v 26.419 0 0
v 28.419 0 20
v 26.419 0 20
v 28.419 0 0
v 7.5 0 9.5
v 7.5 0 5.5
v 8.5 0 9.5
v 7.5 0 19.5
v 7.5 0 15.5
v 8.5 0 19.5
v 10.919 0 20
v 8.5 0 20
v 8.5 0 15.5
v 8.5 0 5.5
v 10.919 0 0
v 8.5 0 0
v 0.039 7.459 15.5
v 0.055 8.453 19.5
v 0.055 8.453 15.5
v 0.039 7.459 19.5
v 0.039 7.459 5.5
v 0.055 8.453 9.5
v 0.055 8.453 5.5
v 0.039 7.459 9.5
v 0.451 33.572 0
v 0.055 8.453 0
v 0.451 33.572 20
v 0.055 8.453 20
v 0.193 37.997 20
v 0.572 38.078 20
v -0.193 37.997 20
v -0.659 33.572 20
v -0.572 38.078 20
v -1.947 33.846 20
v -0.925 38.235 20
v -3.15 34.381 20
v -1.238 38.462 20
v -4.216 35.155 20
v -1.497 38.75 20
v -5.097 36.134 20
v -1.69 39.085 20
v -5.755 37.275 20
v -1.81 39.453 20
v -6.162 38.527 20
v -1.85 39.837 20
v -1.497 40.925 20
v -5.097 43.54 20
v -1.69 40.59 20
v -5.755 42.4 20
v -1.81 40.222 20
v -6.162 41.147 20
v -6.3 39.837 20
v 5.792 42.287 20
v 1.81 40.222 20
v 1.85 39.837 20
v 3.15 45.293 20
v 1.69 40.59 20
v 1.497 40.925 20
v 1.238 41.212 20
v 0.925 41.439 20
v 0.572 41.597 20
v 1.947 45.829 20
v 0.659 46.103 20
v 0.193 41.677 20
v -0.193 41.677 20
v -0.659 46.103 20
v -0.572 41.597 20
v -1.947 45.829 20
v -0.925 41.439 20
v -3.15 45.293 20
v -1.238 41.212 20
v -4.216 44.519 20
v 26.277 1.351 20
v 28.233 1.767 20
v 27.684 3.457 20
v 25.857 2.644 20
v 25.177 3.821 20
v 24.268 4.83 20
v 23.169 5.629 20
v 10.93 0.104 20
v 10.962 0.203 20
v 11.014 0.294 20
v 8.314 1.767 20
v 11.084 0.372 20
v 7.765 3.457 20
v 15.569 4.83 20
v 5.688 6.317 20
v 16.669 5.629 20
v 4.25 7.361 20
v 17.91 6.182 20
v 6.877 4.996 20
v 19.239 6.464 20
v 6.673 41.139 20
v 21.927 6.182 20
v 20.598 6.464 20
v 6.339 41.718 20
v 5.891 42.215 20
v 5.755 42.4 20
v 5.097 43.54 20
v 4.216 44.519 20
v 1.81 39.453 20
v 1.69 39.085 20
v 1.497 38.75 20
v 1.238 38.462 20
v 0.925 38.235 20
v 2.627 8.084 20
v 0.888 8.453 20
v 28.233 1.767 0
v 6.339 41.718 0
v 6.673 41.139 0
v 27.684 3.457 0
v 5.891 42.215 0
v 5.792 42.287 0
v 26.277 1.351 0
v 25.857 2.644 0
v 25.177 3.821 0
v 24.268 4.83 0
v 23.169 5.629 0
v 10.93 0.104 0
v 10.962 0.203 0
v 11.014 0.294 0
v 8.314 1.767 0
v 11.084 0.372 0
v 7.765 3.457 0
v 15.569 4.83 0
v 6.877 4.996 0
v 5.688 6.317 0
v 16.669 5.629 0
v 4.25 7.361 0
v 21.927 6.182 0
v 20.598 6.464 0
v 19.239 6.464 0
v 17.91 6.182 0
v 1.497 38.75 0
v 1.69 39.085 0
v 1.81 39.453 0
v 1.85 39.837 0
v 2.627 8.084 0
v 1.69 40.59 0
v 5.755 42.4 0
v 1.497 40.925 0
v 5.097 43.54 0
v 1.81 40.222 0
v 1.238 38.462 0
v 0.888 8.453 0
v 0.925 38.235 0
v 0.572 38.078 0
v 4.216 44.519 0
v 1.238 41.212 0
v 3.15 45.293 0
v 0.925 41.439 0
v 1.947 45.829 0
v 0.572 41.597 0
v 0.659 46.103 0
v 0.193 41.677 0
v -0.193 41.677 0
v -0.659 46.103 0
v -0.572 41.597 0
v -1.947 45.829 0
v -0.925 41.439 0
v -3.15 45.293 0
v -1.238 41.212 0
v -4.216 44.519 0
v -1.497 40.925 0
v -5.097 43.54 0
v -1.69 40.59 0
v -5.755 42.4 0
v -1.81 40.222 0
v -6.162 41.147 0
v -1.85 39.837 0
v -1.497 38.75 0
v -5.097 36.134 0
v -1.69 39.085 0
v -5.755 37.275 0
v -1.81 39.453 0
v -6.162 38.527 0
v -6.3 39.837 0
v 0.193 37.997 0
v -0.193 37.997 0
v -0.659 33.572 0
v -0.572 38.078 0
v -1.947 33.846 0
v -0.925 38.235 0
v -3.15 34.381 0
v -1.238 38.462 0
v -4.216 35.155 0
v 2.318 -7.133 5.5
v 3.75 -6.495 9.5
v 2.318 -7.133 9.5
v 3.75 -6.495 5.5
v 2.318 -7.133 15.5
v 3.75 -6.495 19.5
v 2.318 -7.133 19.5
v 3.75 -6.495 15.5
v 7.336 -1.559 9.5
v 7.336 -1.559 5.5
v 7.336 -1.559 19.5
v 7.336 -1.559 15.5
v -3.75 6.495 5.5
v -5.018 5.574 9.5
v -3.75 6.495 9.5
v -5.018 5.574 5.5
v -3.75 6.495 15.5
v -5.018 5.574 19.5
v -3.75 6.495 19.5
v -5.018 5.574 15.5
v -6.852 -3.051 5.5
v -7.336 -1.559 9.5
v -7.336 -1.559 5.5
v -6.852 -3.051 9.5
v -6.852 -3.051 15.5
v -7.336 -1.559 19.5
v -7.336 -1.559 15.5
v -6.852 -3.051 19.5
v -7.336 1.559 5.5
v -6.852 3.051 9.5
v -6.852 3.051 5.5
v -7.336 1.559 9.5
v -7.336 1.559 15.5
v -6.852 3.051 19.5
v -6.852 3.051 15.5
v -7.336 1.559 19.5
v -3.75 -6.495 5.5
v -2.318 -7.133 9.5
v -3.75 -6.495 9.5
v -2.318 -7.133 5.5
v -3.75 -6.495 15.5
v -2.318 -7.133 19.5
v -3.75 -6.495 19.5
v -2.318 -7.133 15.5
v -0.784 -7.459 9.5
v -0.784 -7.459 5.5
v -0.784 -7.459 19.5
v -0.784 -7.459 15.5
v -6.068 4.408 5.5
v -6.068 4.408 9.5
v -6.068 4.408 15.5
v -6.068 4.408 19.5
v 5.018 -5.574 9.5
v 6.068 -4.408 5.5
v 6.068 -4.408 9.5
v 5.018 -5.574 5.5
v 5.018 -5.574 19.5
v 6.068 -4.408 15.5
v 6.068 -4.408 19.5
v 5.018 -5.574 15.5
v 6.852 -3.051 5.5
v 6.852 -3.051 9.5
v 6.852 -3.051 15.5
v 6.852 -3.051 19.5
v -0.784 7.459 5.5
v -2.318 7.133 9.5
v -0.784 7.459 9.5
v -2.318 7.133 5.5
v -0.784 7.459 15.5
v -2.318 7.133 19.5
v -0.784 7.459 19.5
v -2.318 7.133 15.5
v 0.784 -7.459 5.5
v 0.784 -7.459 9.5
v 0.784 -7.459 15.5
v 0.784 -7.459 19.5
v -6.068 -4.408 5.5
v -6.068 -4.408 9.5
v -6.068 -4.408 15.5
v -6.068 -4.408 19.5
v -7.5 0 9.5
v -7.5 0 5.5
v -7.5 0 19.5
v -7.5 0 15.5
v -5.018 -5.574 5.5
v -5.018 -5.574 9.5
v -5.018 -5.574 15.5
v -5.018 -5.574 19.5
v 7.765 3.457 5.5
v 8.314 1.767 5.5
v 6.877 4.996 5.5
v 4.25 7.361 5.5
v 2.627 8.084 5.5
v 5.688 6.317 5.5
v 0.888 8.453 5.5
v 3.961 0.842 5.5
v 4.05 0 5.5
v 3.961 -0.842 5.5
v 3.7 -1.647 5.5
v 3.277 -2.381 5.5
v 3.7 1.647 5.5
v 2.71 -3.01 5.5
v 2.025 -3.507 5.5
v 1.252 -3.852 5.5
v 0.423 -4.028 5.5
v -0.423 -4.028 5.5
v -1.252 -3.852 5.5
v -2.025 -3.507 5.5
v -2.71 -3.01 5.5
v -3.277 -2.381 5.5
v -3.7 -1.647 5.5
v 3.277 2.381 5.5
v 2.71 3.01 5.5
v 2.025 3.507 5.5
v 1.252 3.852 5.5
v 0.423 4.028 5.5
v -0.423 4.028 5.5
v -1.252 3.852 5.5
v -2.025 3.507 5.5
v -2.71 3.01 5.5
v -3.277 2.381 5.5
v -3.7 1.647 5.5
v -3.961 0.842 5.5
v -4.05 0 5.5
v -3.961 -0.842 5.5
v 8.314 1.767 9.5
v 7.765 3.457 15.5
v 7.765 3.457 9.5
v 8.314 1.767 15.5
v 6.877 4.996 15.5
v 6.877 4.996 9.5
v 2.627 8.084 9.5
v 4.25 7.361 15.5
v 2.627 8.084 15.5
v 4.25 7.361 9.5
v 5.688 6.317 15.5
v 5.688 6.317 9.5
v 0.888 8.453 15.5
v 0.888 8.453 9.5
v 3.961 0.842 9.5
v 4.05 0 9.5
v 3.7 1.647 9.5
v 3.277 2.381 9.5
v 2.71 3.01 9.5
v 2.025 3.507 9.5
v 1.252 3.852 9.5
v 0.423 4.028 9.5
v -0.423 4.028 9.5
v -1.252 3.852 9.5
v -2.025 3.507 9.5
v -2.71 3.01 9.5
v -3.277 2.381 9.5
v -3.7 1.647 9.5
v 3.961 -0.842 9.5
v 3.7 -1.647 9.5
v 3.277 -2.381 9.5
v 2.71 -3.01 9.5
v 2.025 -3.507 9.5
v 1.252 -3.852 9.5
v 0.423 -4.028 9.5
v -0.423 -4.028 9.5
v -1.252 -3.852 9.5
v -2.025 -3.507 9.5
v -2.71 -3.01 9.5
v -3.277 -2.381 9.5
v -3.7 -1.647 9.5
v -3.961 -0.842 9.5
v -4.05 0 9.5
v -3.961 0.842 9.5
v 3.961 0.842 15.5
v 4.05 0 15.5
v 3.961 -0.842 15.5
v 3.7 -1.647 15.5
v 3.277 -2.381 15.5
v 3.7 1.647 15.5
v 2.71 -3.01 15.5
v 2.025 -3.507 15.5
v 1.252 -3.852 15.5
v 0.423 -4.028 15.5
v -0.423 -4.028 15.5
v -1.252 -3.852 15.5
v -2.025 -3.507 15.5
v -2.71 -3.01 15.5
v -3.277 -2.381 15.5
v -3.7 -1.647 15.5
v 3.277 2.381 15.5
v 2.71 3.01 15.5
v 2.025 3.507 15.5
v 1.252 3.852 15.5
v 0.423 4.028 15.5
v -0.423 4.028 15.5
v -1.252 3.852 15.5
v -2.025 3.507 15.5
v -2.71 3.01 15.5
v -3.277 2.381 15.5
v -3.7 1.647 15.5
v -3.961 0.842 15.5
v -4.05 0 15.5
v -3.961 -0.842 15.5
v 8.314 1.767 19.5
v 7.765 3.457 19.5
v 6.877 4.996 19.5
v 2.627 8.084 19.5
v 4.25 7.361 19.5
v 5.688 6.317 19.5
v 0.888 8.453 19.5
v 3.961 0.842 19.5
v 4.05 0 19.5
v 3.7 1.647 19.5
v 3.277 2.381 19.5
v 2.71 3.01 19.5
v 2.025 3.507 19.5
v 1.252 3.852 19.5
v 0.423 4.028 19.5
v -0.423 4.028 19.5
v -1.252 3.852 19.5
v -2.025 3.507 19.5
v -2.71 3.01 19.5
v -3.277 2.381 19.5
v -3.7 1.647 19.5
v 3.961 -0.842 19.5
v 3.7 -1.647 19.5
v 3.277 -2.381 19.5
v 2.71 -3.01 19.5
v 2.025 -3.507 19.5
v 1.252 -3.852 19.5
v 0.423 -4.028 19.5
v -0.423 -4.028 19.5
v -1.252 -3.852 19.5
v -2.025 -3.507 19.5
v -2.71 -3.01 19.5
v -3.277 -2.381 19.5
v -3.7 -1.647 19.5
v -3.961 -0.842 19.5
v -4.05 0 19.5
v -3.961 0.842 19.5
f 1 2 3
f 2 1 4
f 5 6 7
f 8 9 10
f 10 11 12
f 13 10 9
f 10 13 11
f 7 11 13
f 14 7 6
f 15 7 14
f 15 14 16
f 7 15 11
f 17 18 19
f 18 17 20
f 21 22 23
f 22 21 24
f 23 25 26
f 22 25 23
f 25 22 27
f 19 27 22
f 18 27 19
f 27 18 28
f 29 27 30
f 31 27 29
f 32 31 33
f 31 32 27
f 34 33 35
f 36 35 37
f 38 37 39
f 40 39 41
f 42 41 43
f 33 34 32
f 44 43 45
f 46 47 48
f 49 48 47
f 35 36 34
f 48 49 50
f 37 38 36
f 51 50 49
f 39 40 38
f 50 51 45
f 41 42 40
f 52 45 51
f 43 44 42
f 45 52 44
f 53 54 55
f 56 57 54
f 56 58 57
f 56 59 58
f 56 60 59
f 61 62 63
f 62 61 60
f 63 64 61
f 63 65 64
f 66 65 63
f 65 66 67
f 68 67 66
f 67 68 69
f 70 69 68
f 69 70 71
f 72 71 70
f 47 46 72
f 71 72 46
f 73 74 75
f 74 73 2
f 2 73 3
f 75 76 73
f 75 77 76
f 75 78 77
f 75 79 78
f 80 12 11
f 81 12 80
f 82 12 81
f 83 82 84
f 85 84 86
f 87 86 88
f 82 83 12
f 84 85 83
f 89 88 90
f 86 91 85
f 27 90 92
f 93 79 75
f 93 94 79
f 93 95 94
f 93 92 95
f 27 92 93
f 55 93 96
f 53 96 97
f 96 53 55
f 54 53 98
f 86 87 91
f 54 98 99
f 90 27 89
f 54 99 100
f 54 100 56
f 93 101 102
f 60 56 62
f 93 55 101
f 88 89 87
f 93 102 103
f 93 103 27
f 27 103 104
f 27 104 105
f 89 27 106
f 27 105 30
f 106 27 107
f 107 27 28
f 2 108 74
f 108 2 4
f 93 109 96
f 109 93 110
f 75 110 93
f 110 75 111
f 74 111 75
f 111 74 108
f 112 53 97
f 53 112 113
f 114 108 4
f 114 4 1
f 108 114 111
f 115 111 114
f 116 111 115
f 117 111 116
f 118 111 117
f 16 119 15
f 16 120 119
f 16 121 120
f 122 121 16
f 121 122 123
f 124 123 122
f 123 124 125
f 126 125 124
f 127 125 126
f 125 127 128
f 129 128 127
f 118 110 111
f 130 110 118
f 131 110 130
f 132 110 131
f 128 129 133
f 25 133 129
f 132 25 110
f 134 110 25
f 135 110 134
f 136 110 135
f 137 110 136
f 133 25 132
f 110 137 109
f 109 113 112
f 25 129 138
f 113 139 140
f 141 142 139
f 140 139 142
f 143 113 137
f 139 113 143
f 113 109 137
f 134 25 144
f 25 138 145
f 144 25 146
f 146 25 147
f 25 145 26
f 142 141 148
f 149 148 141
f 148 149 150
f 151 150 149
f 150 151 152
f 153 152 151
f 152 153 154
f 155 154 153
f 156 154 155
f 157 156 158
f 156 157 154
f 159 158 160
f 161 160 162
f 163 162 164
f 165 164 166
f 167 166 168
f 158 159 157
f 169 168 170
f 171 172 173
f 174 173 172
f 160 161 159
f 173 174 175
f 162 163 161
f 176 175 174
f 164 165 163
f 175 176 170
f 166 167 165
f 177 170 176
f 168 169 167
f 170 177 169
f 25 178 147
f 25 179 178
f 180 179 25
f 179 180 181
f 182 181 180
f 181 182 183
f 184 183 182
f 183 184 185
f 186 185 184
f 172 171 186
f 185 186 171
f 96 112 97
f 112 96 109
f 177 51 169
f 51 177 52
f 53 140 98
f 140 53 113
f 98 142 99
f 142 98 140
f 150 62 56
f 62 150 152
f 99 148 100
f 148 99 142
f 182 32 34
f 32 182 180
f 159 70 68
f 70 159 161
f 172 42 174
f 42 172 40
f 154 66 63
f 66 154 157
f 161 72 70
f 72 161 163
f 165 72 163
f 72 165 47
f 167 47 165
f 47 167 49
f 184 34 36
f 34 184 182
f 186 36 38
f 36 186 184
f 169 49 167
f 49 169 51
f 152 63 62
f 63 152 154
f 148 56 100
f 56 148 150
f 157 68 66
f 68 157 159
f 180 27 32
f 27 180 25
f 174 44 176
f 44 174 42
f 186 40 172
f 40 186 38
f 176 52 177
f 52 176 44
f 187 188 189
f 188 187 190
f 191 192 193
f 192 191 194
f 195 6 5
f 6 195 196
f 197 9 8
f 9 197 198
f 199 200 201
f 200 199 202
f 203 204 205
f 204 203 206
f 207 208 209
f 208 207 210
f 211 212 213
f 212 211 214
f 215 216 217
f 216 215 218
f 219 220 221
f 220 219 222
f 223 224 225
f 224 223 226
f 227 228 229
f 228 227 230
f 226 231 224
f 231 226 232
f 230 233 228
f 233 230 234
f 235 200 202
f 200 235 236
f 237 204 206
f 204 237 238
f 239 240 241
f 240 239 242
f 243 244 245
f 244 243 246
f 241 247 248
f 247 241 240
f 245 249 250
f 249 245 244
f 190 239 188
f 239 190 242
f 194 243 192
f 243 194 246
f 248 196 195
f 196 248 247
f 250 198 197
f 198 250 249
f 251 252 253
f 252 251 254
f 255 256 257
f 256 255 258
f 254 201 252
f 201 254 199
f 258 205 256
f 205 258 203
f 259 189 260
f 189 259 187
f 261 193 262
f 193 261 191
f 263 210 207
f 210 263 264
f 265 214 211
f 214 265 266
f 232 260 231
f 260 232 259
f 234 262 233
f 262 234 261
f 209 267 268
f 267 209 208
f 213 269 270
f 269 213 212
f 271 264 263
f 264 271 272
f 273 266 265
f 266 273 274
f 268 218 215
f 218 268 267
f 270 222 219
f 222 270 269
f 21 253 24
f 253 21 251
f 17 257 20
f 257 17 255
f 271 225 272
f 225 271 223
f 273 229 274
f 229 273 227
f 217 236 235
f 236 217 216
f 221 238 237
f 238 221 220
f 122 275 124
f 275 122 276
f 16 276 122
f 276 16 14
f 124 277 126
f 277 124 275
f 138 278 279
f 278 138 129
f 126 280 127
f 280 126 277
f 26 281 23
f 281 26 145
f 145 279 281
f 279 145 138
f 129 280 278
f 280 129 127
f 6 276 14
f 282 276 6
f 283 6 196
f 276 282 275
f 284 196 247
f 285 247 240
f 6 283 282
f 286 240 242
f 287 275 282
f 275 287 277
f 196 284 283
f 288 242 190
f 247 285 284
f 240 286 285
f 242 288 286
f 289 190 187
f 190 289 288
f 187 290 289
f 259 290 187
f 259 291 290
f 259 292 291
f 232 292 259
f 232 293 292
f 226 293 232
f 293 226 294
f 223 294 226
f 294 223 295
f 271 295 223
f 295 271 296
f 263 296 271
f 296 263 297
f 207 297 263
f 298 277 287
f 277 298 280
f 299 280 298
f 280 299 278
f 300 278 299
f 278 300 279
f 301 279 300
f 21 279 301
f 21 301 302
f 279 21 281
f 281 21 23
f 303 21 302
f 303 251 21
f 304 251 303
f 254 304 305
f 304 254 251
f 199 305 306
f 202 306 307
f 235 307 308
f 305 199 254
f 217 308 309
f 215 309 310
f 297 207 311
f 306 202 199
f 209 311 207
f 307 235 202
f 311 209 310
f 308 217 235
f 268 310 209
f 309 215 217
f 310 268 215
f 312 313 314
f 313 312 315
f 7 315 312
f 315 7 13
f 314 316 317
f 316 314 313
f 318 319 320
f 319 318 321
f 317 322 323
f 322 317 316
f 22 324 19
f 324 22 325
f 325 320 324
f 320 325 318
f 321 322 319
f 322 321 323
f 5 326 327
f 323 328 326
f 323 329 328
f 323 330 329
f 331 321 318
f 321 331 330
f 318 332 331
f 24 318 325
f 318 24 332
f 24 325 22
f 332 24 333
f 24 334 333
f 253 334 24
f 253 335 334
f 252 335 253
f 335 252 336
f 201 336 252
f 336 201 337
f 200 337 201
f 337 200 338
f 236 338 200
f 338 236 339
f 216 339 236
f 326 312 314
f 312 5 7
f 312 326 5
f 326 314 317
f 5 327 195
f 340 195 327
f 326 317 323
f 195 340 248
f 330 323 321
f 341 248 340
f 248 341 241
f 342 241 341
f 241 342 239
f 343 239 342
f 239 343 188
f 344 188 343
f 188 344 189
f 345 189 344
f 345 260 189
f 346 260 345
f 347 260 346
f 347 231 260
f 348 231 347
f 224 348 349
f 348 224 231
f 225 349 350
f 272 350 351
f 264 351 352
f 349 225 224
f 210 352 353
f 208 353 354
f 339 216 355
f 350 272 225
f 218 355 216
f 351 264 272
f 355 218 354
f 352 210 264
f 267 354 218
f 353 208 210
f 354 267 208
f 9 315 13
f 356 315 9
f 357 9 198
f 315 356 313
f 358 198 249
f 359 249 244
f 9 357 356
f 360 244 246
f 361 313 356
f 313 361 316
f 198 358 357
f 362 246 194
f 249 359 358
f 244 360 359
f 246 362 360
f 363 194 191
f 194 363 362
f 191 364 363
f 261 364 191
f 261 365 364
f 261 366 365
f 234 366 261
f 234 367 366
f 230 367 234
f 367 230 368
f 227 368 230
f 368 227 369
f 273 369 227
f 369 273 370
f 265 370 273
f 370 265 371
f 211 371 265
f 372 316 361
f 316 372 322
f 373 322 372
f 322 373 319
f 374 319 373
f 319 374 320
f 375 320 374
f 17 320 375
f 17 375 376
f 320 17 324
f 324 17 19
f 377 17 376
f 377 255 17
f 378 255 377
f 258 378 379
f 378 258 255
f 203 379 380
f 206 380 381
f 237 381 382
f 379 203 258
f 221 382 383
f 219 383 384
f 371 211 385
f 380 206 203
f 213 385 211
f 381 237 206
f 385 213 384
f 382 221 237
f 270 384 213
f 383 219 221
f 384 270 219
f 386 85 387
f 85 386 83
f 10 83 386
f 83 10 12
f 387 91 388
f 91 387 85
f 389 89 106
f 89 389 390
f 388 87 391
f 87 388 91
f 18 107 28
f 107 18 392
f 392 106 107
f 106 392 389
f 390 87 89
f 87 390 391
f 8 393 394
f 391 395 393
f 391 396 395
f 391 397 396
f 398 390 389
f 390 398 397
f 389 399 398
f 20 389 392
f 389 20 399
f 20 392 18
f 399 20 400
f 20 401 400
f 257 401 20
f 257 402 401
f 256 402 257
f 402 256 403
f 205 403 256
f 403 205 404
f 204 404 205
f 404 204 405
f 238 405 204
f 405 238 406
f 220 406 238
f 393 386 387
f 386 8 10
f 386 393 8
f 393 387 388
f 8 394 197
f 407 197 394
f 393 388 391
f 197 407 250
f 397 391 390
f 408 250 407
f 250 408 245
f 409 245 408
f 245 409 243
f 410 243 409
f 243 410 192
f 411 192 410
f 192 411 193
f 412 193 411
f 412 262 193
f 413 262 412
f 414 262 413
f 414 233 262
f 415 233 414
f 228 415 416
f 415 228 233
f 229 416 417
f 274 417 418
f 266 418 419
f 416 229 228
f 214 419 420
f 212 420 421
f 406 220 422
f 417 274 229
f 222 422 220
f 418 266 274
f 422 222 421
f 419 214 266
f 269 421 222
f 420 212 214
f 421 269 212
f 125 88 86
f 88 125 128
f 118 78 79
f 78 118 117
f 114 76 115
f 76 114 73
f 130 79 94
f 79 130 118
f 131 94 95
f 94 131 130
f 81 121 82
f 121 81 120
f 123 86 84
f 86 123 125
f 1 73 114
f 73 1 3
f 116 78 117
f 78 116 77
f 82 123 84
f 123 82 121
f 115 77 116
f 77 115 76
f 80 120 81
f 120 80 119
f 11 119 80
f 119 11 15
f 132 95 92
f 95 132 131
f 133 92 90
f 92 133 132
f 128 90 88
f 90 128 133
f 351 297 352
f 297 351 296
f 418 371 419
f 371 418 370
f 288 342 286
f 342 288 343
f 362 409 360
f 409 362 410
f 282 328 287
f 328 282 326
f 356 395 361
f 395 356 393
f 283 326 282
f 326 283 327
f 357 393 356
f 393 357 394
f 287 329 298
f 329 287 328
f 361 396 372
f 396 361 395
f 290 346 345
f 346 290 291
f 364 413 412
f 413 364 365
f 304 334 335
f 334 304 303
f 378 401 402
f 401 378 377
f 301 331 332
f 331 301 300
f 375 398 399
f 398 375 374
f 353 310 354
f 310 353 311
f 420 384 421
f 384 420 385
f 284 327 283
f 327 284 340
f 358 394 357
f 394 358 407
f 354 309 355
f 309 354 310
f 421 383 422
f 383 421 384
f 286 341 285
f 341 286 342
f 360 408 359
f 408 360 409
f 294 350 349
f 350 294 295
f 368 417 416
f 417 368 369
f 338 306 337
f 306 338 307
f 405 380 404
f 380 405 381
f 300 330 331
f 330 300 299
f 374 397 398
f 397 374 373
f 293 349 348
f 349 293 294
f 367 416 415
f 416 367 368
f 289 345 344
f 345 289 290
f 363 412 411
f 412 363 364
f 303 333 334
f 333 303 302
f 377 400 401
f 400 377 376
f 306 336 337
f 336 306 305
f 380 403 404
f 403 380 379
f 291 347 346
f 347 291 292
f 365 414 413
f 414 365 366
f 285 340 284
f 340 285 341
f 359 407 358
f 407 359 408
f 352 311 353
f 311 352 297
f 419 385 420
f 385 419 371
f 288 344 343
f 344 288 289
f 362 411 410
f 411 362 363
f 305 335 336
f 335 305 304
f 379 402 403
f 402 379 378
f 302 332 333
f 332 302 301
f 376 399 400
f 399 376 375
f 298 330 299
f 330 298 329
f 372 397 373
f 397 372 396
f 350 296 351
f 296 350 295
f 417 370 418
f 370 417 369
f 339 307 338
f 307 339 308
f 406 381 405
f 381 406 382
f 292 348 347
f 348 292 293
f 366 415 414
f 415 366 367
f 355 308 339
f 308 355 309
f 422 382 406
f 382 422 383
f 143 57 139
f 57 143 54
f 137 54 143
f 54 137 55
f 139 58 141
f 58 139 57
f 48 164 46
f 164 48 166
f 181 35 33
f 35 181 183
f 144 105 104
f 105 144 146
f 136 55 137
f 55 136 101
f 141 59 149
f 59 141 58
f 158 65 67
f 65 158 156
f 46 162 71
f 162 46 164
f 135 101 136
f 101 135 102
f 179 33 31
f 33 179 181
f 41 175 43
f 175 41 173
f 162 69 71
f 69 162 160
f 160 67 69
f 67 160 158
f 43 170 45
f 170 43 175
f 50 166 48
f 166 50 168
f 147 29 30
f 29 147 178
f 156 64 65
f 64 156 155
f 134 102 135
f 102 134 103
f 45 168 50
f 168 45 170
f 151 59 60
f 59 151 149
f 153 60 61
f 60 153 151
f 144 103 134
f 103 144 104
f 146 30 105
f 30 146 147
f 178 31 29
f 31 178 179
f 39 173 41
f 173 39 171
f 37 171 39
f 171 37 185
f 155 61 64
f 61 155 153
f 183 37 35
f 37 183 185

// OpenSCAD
// file: ../888_1005.scad
include <../parameters.scad>


module 888_1005() {
	difference() {
		union() {
			hull() {
				cube([lock_hold_arm_length, 5, lock_depth]);

				translate([lock_axle_diameter/4, lock_push_arm_length, 0])
				cylinder(d=M3_screw_diameter*2, h=lock_depth, $fn=30);

				translate([lock_hold_arm_length, 0, 0])
				difference() {
					cylinder(d=lock_axle_diameter+2, h=lock_depth, $fn=30);
		
					translate([-lock_axle_diameter, -lock_axle_diameter*2, -1])
					cube(lock_axle_diameter*2);
				}
			}

			translate([0, lock_push_arm_length, 0])
			cylinder(d=M3_nut_diameter+6, h=lock_depth, $fn=30);

			cylinder(d=lock_axle_diameter, h=lock_depth, $fn=30);
		}

		// arm pusher shape
		translate([lock_hold_arm_length, 0, -1])
		hull() {
			cylinder(d=lock_grab_axle_dia, h=lock_depth+2, $fn=30);

			translate([-12/2-2.5, 0, 0])
			cylinder(d=1, h=lock_depth+2, $fn=30);
		}


		// axle holes
		translate([0, 0, -1])
		cylinder(d=8.1, h=lock_depth+2, $fn=30);

		translate([0, lock_push_arm_length, -1])
		cylinder(d=M3_screw_diameter+.5, h=lock_depth+2, $fn=30);

		// axle holes for second lock arm
		for(i=[0:10:lock_depth]) {
			translate([0, 0, i-.5])
			cylinder(d=lock_axle_diameter+2, h=6, $fn=30);
		}
	}
}

888_1005();

translate([0, .1, lock_depth])
rotate([180, 0, 0])
#888_1005();
// file: ../../parameters.scad
maximum_printable_size = 150;

layer_thickness = 0.3;
global_clearance = 0.5;


//Screw diameter and nut for M10 [mm]
M10_screw_diameter = 10.4;
M10_head_height = 10;
M10_head_diameter = 16+0.5;
M10_nut_height = 10.5;
M10_nut_diameter = 25.5;
M10_nut_pocket = 22.3;

//Screw diameter for M8 [mm]
M8_screw_diameter = 8.6;
M8_head_height = 8;
M8_head_diameter = 13.5;
M8_nut_height = 7.5;
M8_square_nut_thin_height = 4.5;
M8_nut_diameter = 14.4 + 0.5;
M8_nut_pocket = 13 + 0.5;
M8_washer_diameter = 16;
M8_washer_thickness = 1.5;


//Screw diameter and nut for M6 [mm]
M6_screw_diameter=6.5;
M6_head_diameter = 10+0.5;
M6_head_height = 6;
M6_nut_height = 4.9;
M6_nut_diameter = 11.8;
M6_nut_pocket = 10.4;
M6_square_nut_height = 3;
M6_square_nut_diameter = 10;
M6_washer_thickness = 1.6;

//Screw diameter and nut for M5 [mm]
M5_screw_diameter=5.5;
M5_head_height = 5;
M5_head_diameter = 13+0.5;
M5_nut_height = 4.5;
M5_nut_diameter = 9.4;
M5_nut_pocket = 8.4;

//Screw diameter and nut for M4 [mm]
M4_screw_diameter=4.5;
M4_screw_head_height = 4;
M4_nut_height = 3.2;
M4_nut_diameter = 8.4;
M4_nut_pocket = 7.5;

//Screw diameter and nut for M3 [mm]
M3_screw_diameter = 3.2;
M3_nut_height = 2.7;
M3_nut_diameter = 6.6;
M3_nut_pocket = 5.6;
M3_screw_head_height = 3;

//Screw diameter and nut for M2,5 [mm]
M2_5_screw_diameter = 2.7;
M2_5_nut_height = 2.3;
M2_5_nut_diameter = 6;
M2_5_nut_pocket = 5.5;

// kulove lozisko

bearing_efsm_08_h = 33+1;
bearing_efsm_08_m = 22;
bearing_efsm_08_db = 18;
bearing_efsm_08_ag = 10.5;
bearing_efsm_08_n = M4_screw_diameter;
bearing_efsm_08_a1 = 5.5;
bearing_efsm_08_d = 8.25;
bearing_efsm_08_B = 8; // ball height

bearing_efsm_10_h = 38+1;
bearing_efsm_10_m = 26;
bearing_efsm_10_db = 21.9;
bearing_efsm_10_ag = 12+0.2;
bearing_efsm_10_n = M5_screw_diameter;
bearing_efsm_10_a1 = 6.5;
bearing_efsm_10_d = 10.25;


bearing_efsm_12_width = 40+1;
bearing_efsm_12_h = bearing_efsm_12_width;
bearing_efsm_12_boltd = 28/2; // polovina vzdalenosti mezi srouby
bearing_efsm_12_m = bearing_efsm_12_boltd*2;
bearing_efsm_12_db = 25;
bearing_efsm_12_ag = 13;
bearing_efsm_12_a1 = 7;
bearing_efsm_12_n = M5_screw_diameter;
bearing_efsm_12_d = 12.15;
bearing_efsm_12_B = 10; // ball height
bearing_efsm_space = 1;

bearing_efsm_17_width = 54+1;
bearing_efsm_17_h = bearing_efsm_17_width;
bearing_efsm_17_boltd = 38/2; // polovina vzdalenosti mezi srouby
bearing_efsm_17_m = bearing_efsm_17_boltd*2;
bearing_efsm_17_db = 35;
bearing_efsm_17_ag = 18;
bearing_efsm_17_n = M6_screw_diameter;
bearing_efsm_17_a1 = 10;
bearing_efsm_17_B = 17; // ball height

//limcove lozisko
bearing_EFOM_10_L=26; //celkova sirka zakladny
bearing_EFOM_10_d1=10.3;//diametr otvoru real=10 mm
bearing_EFOM_10_dB=22;//diametr vystupku pro ulozeni lozika
bearing_EFOM_10_H=52;//celková delka zakladny
bearing_EFOM_10_J=36;// hole pitch
bearing_EFOM_10_A1=6.5;//vyska pouzdra
bearing_EFOM_10_Ag=12;//celkova vyska
bearing_EFOM_10_N1=5;//sirka otvoru pro sroub
bearing_EFOM_10_N2=8;//delka otvoru pro sroub
bearing_EFOM_10_m=36;//roztec der pro sroub
bearing_EFOM_10_h=9;//vyska lozika


608_bearing_outer_diameter = 22.3;
608_bearing_inner_diameter = 16;
608_bearing_thickness = 7.1;


// 20 KG servo parameters

servo_20kg_axis_offset = 9.375; // jak je osa mimo stredu
servo_20kg_body_x = 42;
servo_20kg_body_y = 21;
servo_20kg_body_z = 40;
servo_20kg_thread_x = 49/2;
servo_20kg_thread_y = 10/2;
servo_20kg_body_below = 10; // jak hluboko je tělo serva pod drzaky na srouby
servo_20kg_below = 25.8; // jak hluboko je páka serva pod drzaky na srouby

servo_20kg_bolt_d = 2.5+0.3;
servo_20kg_nut_d = 5+0.3;


//strain gauge
strain_gauge_width = 12.7;
strain_gauge_length = 75.1;
strain_gauge_screw_distance = 10;

//ALU profile
ALU_profile_width = 30.5;
ALU_profile_holder_wall_thickness = 3;
ALU_profile_groove_width = 8;

//pillow block bearing
//https://www.igus.eu/product/372
//Part no. KSTM-08
KSTM08_screws_distance = 33;         //m
KSTM08_screws_holes_diameter = 4.5;  //d2
KSTM08_flange_thickness = 6;         //h3
KSTM08_case_width = 9;               //C1
KSTM08_case_length = 47;             //a
KSTM08_ball_width = 12;              //B
KSTM08_ball_hole_diameter = 7.85;    //d1


//ložiska pro malý rotor
bearing_outer_diameter = 10.2;    // Rozměr B1 v nákresu s přídavkem na toleranci otvoru
bearing_thickness = 4;        // Rozměr B2 v nákresu
//bearing_shaft_length = 19.5;    // Rozměr B3 v nákresu, Originalni hodnota 19.5
bearing_shaft_length = 20;    // Rozměr B3 v nákresu


//simple platform parameters
front_holder_width = 160;
front_holder_angle = 25;
front_holder_height = 60;
front_holder_offset = 15;

solenoid_travel = 25;
solenoid_force = 40;

solenoid_joint_distance = 23;
solenoid_joint_angle = 60;

lock_grab_axle_dia = 13;
lock_axle_diameter = 15;
lock_holding_force = 20;
lock_depth = 20;

lock_push_force = pow(cos(solenoid_joint_angle), 2)*solenoid_force;
lock_push_arm_length = tan(solenoid_joint_angle)*solenoid_joint_distance;
lock_hold_arm_length = (lock_push_force*lock_push_arm_length)/lock_holding_force;
lock_joint_arm_length = sqrt(pow(lock_push_arm_length, 2)+pow(solenoid_joint_distance, 2));

servo_joint_offset = 25;
servo_arm_length = 24;
servo_arm_hole_length = sqrt(pow(solenoid_travel, 2)+pow(servo_arm_length, 2))-servo_arm_length;
// main file
include <../../parameters.scad>

use <../888_1005.scad>

888_1005();
